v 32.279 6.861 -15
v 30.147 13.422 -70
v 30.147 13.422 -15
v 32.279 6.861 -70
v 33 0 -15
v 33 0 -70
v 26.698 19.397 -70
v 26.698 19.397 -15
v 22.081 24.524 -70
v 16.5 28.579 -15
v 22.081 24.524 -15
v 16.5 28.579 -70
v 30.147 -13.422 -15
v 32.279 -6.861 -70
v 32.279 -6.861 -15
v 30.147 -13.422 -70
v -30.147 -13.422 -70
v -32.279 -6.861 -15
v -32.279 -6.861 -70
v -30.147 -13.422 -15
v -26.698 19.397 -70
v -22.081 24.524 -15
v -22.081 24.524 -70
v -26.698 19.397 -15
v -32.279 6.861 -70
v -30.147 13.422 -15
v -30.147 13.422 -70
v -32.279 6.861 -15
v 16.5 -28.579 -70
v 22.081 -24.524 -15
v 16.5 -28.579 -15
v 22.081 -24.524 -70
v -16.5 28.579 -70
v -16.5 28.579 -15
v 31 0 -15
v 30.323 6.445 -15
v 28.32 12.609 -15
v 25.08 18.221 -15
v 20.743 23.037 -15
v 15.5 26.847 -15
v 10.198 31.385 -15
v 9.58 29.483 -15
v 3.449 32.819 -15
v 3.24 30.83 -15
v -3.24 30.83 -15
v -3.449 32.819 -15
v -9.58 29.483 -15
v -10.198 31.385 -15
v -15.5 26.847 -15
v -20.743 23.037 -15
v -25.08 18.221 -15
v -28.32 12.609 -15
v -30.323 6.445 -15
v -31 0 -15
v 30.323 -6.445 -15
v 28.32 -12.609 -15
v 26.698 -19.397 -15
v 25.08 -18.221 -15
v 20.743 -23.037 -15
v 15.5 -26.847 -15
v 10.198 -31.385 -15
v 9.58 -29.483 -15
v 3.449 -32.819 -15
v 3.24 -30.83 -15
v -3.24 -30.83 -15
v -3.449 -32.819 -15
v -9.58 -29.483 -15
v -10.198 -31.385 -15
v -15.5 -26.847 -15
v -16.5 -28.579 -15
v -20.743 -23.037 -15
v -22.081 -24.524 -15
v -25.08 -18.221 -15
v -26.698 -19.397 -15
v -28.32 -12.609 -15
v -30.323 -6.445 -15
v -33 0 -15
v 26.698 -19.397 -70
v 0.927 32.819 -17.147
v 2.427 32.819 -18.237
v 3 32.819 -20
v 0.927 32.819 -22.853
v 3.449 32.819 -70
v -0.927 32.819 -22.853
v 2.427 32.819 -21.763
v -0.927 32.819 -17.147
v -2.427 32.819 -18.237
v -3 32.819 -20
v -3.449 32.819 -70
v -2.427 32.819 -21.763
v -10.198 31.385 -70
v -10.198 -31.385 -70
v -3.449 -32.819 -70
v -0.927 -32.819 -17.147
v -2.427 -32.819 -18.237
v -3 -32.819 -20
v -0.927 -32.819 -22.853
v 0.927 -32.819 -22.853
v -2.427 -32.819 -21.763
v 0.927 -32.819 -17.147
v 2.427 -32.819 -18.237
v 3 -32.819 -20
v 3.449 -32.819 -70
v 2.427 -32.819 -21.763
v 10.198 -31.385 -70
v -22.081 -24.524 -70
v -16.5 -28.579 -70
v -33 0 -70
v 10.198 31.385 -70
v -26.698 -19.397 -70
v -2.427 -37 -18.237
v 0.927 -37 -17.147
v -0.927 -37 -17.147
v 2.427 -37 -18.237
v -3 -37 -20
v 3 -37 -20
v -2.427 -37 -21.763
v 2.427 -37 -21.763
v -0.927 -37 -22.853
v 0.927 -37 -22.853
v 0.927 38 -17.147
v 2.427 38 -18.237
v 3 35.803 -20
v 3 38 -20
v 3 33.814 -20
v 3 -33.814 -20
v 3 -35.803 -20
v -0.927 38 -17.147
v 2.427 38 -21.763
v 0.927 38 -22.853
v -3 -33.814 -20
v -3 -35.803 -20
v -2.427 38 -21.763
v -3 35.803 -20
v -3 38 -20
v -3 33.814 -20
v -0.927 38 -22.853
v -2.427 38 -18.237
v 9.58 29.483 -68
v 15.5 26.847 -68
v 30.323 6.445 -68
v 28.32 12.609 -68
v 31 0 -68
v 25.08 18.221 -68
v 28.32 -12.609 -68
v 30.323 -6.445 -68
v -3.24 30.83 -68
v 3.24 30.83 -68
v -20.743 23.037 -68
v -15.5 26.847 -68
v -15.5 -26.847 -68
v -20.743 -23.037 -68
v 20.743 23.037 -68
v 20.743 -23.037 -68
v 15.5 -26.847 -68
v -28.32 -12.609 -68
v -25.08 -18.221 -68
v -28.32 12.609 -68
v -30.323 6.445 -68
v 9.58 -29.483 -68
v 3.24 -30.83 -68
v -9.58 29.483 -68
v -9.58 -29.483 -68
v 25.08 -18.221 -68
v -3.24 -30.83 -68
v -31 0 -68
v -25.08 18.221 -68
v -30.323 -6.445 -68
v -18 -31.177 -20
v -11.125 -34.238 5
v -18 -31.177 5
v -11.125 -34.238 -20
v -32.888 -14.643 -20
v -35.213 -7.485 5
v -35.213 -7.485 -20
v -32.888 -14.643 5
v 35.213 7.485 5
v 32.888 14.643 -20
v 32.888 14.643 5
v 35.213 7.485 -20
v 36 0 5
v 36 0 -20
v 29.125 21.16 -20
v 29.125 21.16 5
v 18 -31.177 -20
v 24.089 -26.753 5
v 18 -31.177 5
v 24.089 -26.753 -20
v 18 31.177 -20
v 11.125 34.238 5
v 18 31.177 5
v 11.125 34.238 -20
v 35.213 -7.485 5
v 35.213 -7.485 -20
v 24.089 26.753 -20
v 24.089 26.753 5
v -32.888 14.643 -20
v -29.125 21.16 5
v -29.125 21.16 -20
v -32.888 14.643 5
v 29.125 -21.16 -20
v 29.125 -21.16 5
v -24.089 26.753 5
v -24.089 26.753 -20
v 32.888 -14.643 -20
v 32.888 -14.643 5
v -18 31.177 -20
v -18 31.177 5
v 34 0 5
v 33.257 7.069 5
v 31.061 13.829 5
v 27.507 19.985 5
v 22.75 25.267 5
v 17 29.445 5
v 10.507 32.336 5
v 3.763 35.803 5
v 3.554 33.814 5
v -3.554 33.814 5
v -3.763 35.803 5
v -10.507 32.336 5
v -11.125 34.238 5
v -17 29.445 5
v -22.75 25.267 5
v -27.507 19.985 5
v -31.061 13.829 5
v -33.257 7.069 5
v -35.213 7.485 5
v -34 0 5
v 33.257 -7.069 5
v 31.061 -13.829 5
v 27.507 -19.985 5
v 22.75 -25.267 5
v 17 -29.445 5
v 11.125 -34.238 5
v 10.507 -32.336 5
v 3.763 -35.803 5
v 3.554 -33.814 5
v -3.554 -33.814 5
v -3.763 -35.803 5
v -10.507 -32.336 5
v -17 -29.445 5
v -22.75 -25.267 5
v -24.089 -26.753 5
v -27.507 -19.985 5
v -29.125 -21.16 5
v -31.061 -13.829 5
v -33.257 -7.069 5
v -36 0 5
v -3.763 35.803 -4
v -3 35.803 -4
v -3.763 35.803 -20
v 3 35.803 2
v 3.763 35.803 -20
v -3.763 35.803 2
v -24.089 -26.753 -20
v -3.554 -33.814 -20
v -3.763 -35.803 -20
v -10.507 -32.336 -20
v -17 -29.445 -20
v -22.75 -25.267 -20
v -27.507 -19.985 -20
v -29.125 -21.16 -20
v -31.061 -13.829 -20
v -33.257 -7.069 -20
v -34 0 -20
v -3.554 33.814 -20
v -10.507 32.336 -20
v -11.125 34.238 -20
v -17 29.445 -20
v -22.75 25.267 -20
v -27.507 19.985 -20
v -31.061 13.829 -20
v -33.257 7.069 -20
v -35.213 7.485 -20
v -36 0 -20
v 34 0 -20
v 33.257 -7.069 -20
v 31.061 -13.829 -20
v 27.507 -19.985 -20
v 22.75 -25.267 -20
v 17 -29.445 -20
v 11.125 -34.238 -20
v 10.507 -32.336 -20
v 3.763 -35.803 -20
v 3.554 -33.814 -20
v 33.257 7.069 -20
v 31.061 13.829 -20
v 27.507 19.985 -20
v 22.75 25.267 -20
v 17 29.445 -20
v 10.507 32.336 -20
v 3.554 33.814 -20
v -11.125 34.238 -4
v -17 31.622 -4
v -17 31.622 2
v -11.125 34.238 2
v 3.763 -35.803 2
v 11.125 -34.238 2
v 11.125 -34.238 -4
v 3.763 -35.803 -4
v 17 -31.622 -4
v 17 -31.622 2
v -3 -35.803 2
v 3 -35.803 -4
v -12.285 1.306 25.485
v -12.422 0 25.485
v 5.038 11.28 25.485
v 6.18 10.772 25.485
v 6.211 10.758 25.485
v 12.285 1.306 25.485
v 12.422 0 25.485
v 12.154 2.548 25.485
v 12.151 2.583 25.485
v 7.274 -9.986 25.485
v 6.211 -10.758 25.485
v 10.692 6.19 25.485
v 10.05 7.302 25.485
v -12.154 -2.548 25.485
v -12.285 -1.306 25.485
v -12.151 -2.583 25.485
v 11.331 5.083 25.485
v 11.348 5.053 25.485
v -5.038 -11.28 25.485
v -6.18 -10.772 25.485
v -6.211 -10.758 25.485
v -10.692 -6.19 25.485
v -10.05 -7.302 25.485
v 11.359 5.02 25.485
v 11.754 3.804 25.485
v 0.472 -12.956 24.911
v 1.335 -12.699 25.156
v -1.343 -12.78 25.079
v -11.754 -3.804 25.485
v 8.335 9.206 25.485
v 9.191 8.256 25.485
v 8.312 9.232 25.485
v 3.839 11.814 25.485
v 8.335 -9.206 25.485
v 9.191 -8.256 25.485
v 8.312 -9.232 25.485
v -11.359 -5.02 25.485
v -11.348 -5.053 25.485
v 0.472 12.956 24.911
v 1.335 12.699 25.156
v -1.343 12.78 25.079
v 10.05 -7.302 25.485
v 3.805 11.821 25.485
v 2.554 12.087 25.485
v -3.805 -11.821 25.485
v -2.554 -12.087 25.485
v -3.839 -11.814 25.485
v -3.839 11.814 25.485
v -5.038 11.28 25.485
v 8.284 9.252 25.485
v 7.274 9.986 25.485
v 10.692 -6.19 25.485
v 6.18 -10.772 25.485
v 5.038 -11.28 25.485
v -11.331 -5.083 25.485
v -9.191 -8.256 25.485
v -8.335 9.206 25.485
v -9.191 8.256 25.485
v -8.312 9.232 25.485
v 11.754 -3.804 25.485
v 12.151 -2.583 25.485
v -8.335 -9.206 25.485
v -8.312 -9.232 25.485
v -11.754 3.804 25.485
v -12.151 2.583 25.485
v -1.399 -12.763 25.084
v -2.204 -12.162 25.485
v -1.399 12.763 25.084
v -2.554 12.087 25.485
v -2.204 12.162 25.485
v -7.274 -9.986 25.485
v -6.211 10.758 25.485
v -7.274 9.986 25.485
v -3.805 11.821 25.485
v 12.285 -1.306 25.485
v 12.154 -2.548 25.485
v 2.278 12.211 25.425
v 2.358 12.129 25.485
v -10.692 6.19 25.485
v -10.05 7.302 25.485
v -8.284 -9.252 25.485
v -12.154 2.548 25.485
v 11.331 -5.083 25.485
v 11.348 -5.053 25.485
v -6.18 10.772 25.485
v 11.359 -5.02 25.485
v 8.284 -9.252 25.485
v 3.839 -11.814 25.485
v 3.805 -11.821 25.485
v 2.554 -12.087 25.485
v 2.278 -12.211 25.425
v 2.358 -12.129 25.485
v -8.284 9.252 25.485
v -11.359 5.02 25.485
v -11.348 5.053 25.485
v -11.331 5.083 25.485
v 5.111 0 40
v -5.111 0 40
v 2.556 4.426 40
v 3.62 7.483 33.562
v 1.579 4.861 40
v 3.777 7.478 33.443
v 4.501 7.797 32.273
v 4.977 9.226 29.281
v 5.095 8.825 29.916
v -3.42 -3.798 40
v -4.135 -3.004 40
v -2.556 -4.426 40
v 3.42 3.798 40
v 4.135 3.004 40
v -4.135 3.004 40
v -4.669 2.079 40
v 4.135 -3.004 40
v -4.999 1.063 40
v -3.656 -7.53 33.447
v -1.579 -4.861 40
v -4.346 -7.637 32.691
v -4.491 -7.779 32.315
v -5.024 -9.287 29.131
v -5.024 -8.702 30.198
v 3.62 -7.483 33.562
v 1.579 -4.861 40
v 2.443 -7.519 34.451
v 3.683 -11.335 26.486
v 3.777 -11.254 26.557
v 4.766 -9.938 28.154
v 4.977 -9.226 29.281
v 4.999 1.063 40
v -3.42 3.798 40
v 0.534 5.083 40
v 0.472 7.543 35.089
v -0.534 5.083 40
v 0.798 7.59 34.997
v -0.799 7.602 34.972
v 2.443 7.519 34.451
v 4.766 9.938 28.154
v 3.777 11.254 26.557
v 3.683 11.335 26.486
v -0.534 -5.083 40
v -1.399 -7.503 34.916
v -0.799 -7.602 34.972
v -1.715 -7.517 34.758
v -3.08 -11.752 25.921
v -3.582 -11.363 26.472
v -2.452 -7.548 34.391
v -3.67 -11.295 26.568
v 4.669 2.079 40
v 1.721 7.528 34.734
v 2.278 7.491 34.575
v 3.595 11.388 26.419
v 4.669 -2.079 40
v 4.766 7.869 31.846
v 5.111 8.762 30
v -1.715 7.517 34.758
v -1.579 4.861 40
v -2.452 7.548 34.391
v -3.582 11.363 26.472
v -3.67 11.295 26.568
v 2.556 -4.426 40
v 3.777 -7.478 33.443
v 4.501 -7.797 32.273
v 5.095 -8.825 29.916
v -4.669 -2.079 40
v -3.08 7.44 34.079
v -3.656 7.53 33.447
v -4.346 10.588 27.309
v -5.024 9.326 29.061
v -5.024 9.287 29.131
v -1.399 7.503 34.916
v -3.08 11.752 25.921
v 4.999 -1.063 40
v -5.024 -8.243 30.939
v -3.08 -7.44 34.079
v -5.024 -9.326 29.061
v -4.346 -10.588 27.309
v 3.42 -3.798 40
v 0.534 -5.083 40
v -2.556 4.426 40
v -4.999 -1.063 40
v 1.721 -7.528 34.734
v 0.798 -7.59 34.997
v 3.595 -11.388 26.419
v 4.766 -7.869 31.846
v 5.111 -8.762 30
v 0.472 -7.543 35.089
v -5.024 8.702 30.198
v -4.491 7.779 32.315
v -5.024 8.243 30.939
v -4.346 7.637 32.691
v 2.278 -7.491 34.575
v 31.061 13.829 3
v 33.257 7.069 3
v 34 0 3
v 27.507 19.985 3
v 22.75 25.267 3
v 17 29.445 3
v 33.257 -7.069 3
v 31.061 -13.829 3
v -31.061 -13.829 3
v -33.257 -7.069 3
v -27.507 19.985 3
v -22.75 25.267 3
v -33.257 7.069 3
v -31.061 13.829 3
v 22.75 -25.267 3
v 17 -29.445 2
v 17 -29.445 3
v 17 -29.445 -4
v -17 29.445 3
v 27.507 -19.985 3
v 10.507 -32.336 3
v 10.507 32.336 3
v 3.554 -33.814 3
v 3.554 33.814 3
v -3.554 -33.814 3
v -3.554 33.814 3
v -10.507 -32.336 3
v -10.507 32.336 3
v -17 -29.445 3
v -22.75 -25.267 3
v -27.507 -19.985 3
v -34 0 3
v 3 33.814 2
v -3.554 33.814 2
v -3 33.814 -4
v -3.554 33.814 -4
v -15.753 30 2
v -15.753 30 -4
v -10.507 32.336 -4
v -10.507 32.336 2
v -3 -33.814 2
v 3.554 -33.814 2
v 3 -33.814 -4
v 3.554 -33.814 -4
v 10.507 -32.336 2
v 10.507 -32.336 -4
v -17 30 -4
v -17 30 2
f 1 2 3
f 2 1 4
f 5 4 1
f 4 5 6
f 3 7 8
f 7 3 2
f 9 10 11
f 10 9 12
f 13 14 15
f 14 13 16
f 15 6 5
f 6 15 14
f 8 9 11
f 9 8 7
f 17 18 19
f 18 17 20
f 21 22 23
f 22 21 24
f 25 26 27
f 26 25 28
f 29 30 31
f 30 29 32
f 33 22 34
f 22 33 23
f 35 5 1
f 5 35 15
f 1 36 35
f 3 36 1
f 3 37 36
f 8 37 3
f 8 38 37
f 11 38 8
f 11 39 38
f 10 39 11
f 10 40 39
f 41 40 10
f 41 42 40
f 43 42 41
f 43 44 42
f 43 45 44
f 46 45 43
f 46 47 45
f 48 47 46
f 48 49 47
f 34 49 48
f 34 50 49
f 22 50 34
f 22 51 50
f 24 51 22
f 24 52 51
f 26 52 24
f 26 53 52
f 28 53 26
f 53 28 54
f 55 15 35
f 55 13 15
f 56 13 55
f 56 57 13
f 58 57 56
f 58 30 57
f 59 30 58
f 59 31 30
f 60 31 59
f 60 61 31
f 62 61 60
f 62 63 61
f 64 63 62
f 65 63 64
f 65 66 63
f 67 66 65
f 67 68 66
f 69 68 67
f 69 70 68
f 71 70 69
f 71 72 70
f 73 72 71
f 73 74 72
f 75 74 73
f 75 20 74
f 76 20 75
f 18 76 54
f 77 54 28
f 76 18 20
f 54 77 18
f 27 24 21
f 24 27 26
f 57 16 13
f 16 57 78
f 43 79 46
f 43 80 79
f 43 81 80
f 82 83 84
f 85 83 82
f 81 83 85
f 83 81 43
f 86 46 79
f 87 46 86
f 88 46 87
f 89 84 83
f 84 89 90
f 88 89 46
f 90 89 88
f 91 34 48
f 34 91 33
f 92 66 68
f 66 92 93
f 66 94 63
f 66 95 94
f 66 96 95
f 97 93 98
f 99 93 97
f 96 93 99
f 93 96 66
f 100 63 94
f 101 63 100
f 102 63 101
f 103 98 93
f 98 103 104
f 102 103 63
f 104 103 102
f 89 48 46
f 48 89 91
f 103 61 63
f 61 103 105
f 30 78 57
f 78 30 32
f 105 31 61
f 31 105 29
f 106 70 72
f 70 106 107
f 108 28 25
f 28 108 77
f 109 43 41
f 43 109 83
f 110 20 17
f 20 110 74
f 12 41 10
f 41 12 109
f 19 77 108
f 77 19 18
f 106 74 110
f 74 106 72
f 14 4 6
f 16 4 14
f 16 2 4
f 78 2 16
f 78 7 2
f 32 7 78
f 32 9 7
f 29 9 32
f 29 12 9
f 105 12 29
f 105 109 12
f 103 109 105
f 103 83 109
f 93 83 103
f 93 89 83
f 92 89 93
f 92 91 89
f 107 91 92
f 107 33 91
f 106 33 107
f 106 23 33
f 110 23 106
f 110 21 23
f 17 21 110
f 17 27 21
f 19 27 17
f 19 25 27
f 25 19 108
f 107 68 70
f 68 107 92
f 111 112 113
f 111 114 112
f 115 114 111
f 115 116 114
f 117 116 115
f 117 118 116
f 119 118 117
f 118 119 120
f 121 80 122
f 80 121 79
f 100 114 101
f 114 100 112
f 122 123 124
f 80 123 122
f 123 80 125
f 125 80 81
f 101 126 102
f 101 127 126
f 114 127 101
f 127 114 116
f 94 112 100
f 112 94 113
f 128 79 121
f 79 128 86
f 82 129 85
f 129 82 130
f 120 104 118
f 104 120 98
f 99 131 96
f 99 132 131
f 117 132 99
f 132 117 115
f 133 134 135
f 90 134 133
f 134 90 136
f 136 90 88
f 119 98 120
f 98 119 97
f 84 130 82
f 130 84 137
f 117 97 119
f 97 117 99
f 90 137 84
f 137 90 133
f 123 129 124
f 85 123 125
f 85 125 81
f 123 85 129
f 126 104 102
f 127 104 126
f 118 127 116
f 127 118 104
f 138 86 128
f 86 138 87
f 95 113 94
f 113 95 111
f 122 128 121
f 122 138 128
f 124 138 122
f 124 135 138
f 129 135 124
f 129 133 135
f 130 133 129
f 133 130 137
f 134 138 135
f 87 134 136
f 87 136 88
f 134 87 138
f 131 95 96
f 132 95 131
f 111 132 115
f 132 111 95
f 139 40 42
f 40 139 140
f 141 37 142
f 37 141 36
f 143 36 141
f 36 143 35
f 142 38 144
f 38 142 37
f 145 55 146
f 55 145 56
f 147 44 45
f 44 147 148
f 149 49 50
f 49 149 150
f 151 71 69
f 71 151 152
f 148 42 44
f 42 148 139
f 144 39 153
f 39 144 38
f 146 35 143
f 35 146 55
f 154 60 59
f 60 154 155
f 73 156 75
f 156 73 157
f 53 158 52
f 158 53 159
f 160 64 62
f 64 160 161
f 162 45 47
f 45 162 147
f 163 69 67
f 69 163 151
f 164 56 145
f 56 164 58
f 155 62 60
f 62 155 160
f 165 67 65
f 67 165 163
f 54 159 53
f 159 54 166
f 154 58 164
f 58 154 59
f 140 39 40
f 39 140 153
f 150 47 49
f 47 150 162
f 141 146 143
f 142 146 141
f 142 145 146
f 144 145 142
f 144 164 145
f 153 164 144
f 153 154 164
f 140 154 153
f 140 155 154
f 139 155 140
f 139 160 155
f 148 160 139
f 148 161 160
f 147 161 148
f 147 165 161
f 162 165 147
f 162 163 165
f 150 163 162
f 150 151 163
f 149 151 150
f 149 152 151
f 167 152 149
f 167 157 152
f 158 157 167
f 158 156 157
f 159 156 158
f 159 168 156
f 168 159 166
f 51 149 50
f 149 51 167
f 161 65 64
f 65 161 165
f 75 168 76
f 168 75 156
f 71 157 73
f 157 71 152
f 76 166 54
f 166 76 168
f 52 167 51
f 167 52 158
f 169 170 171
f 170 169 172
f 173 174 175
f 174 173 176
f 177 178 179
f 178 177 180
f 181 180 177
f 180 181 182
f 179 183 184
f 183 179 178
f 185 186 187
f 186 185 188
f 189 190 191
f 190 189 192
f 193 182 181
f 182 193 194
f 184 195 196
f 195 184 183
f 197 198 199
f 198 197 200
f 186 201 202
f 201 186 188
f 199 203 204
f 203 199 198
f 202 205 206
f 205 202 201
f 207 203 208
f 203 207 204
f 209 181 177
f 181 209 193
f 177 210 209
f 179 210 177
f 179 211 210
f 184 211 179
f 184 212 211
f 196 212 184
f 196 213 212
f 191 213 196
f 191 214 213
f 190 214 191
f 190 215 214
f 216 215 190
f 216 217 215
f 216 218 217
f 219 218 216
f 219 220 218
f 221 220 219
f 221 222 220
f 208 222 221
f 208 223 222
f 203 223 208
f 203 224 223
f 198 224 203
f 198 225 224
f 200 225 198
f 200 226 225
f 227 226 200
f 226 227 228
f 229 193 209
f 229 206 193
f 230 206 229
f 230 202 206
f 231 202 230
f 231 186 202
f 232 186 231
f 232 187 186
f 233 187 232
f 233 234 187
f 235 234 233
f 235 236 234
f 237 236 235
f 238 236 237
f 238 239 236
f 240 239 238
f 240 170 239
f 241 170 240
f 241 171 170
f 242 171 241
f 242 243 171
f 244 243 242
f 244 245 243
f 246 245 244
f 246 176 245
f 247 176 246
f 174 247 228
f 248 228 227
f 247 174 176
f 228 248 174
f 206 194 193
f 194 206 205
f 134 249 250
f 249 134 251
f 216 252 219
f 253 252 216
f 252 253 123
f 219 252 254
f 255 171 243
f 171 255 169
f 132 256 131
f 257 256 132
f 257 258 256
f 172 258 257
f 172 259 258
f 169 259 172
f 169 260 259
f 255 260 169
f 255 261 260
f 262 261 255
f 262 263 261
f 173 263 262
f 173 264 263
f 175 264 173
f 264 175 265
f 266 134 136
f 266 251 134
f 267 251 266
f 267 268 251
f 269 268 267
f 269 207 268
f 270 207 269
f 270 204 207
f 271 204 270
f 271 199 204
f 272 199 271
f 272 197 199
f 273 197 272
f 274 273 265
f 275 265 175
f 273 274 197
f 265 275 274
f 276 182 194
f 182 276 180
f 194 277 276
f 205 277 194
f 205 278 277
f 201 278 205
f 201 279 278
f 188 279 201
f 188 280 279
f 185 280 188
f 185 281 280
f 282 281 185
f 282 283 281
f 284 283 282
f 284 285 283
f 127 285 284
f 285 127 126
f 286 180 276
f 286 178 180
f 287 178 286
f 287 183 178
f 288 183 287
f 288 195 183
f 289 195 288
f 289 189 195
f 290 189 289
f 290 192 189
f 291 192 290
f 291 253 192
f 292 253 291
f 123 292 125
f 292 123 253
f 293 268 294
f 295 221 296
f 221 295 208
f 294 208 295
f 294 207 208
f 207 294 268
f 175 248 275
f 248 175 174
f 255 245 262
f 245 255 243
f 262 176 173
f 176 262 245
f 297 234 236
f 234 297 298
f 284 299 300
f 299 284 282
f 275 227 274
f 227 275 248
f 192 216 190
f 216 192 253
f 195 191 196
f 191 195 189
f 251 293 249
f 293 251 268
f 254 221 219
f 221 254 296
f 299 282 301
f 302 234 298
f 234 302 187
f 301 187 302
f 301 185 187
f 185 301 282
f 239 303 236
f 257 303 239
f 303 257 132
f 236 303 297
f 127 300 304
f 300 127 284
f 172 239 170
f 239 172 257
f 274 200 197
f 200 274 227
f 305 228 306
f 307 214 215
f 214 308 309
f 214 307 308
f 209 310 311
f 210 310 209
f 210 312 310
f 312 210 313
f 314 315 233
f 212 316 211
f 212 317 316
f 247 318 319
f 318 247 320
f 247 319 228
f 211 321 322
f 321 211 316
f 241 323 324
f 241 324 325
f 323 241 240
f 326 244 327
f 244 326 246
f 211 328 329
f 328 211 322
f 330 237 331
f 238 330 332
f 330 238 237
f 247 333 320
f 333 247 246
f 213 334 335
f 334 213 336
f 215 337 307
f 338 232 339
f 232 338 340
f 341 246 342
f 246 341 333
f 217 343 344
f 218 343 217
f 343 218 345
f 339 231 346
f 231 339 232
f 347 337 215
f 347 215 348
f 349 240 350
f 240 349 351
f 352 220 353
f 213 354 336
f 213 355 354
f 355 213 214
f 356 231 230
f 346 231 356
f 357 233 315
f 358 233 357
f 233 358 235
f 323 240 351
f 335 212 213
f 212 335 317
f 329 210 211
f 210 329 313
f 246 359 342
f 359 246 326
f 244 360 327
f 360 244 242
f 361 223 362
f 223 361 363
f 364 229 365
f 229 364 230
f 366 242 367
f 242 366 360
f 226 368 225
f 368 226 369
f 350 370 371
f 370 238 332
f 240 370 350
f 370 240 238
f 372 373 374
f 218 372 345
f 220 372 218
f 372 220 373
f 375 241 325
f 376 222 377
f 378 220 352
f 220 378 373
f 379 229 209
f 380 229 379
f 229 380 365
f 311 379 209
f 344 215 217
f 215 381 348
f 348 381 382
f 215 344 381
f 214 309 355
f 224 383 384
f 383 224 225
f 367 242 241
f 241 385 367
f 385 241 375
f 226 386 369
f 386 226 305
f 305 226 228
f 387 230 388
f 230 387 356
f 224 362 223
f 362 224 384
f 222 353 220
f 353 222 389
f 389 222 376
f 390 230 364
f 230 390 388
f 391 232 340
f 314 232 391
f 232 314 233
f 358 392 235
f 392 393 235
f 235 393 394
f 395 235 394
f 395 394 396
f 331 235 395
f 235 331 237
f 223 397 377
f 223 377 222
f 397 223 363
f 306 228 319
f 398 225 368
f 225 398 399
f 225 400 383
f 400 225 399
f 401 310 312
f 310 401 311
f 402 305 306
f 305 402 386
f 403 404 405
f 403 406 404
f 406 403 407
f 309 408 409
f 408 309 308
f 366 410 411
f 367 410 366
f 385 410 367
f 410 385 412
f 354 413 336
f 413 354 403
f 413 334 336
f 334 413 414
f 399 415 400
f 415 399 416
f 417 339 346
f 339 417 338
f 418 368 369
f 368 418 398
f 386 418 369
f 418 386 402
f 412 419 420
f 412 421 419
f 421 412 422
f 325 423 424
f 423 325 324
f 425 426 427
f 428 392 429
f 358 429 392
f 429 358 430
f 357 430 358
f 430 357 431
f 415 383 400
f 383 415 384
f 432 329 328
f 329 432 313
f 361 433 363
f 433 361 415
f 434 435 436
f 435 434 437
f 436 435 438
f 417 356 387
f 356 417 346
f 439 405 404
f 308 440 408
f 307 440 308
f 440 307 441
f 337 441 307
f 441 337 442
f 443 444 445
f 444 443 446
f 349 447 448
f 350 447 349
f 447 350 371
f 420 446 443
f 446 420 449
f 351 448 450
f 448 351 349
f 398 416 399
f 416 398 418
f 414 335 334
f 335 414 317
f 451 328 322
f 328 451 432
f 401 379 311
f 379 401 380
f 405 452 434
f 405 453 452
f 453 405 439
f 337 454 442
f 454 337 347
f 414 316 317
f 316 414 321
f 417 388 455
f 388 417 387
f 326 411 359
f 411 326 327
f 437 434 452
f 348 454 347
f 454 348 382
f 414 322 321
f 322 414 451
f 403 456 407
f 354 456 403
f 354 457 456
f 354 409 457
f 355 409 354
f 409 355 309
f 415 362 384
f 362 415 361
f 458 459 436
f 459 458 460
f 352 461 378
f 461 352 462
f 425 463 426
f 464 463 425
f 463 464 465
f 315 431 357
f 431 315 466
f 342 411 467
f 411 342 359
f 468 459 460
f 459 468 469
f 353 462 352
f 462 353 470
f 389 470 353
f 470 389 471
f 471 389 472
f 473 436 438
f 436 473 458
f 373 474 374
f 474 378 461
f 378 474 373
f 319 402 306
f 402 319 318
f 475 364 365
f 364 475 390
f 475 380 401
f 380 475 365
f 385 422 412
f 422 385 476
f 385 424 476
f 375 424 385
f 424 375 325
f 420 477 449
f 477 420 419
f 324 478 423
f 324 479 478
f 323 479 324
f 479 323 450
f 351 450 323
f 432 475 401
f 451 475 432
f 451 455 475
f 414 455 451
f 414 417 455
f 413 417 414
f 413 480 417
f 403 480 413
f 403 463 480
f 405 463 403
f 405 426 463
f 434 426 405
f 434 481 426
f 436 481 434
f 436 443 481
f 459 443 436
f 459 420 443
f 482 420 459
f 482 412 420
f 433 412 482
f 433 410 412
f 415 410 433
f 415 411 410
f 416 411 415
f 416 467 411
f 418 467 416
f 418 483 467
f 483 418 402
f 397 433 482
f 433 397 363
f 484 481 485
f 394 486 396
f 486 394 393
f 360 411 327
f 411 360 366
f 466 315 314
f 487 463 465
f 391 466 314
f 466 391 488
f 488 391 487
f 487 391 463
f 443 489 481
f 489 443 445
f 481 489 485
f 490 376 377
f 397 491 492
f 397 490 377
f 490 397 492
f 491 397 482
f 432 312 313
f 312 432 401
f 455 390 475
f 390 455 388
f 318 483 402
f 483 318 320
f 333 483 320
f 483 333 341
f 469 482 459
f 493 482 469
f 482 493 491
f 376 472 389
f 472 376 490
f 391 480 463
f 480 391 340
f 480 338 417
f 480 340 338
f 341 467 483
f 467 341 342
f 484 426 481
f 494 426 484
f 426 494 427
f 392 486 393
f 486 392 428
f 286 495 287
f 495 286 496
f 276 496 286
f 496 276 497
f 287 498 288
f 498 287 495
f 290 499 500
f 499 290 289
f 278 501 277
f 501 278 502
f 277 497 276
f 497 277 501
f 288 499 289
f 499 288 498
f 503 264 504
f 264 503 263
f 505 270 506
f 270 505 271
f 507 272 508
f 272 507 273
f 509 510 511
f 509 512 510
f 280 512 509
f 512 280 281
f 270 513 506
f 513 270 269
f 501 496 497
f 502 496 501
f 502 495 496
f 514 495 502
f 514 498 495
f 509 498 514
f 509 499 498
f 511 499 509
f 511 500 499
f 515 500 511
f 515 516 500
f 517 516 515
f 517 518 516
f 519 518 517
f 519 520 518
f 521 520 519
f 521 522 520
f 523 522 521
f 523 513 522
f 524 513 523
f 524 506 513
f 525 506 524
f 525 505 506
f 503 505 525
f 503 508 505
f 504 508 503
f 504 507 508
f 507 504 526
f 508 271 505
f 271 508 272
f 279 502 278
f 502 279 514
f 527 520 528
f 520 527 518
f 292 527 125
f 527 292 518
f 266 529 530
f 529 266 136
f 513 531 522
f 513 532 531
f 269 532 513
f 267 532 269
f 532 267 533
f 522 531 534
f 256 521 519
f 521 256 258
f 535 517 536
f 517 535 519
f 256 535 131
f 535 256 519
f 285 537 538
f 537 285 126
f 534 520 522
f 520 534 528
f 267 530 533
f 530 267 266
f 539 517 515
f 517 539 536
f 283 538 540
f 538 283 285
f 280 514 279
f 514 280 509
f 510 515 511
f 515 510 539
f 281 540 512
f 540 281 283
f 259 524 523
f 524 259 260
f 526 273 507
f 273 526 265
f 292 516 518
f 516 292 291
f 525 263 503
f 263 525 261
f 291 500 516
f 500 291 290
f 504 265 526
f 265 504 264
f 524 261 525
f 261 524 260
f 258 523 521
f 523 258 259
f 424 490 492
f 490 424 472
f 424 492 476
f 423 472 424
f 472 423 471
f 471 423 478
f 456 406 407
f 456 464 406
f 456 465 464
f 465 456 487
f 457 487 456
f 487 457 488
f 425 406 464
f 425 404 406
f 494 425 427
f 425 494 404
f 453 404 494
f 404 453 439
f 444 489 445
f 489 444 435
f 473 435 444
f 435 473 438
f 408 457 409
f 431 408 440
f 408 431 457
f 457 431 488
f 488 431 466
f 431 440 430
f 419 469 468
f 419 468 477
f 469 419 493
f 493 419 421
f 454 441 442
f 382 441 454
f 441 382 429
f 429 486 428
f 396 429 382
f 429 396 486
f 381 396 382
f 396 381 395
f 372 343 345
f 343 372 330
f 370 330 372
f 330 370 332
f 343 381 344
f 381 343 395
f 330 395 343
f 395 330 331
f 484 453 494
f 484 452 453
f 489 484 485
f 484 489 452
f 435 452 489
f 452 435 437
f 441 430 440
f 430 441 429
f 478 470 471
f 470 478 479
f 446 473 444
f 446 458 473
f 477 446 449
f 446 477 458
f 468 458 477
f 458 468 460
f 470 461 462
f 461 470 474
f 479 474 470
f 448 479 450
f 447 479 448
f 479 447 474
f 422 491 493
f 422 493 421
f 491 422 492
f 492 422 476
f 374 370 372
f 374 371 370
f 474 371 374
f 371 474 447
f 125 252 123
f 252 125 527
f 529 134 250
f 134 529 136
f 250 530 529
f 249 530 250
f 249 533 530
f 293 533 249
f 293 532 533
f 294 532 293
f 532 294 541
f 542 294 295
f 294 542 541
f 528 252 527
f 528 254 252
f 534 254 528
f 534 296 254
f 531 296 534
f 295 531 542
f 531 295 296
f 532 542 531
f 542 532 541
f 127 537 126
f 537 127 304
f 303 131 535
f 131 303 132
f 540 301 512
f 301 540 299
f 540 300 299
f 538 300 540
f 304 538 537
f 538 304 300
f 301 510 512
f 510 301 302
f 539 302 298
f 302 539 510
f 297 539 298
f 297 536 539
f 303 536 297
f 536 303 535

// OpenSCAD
bDrawHat = true;
bDrawOuterCylinder = true;
bDrawInnerCylinder = false;

// Inner cylinder
innerHeight=50;
innerCylinderOuter = 25;
innerCylinderInner = 23;
innerCylinderBevel = 5;


// Outer cylinder
outerCylinderHole = innerCylinderOuter+innerCylinderBevel+1;
outerCylinderOuter = outerCylinderHole + 2;


// Hat
hatInnerCylinderSize = outerCylinderOuter + 1;
hatOuterCylinderSize = hatInnerCylinderSize + 2;
topSize = innerCylinderInner / 3;


if (bDrawInnerCylinder) {
    drawInnerCylinder();
}

if (bDrawOuterCylinder) {
    translate([0,0,-70])
        drawOuterCylinder();
}

if (bDrawHat){
    translate([0,0,-20])
        drawHat();
}


module drawInnerCylinder() {
    difference() {
        union() {
            cylinder(r1=innerCylinderOuter+innerCylinderBevel, 
                r2=innerCylinderOuter + innerCylinderBevel, h=innerHeight / 10);
            cylinder(r1=innerCylinderOuter, r2=innerCylinderOuter, h=innerHeight);
            translate([0,0,innerHeight - (innerHeight / 10)])
                cylinder(r1=innerCylinderOuter+innerCylinderBevel, 
                    r2=innerCylinderOuter+innerCylinderBevel, h=innerHeight / 10);
        }
        translate([0,0,2])
            cylinder(r1=innerCylinderInner, r2=innerCylinderInner, h=innerHeight);        
    }
}

module drawOuterCylinder() {
    difference() {
        union() {
            cylinder(r1=outerCylinderOuter, r2=outerCylinderOuter, h=innerHeight + 5);
            // TODO: screw part?
            rotate([90,0,0])
                translate([0,50,-38])
                cylinder(r1=3, r2=3, innerCylinderOuter * 3);
        }
        translate([0,0,2])
            cylinder(r1=outerCylinderHole, r2=outerCylinderHole, h=innerHeight + 5);
    }    
}

module drawHat() {    
    // section that screws in
    difference() {
        union() {
            cylinder(r1=hatOuterCylinderSize, r2=hatOuterCylinderSize, h=innerHeight / 2);
            translate([0,0,innerHeight / 2])
                cylinder(r1=hatInnerCylinderSize, r2=topSize, h=innerHeight / 2);
                        translate([0,0,innerHeight / 2])
            translate([0,0,(innerHeight/2 - 5)])
                cylinder(r1=topSize + 5, r2=topSize*2 /3, h=15);    
    
        }
        translate([0,0,-2])
            cylinder(r1=hatInnerCylinderSize, r2=hatInnerCylinderSize, h=innerHeight / 2);       
        translate([0,50,innerHeight])
            rotate([90, 0, 0])
                cylinder(r1=topSize * 2 / 3, r2=topSize * 2 / 3, h=150);
        
        // Side A slider
        translate([-3, 30, -2])
          cube([6, 10, 20]);        
        translate([-17, 30, 22])
            rotate([0, 90,0])
                cube([6, 10, 20]);
        
        
        // Side B slider
        translate([-3, -38, -2])
          cube([6, 10, 20]);
        
        translate([-3, -38, 22])
            rotate([0, 90,0])
                cube([6, 10, 20]);    
    }
        
}
